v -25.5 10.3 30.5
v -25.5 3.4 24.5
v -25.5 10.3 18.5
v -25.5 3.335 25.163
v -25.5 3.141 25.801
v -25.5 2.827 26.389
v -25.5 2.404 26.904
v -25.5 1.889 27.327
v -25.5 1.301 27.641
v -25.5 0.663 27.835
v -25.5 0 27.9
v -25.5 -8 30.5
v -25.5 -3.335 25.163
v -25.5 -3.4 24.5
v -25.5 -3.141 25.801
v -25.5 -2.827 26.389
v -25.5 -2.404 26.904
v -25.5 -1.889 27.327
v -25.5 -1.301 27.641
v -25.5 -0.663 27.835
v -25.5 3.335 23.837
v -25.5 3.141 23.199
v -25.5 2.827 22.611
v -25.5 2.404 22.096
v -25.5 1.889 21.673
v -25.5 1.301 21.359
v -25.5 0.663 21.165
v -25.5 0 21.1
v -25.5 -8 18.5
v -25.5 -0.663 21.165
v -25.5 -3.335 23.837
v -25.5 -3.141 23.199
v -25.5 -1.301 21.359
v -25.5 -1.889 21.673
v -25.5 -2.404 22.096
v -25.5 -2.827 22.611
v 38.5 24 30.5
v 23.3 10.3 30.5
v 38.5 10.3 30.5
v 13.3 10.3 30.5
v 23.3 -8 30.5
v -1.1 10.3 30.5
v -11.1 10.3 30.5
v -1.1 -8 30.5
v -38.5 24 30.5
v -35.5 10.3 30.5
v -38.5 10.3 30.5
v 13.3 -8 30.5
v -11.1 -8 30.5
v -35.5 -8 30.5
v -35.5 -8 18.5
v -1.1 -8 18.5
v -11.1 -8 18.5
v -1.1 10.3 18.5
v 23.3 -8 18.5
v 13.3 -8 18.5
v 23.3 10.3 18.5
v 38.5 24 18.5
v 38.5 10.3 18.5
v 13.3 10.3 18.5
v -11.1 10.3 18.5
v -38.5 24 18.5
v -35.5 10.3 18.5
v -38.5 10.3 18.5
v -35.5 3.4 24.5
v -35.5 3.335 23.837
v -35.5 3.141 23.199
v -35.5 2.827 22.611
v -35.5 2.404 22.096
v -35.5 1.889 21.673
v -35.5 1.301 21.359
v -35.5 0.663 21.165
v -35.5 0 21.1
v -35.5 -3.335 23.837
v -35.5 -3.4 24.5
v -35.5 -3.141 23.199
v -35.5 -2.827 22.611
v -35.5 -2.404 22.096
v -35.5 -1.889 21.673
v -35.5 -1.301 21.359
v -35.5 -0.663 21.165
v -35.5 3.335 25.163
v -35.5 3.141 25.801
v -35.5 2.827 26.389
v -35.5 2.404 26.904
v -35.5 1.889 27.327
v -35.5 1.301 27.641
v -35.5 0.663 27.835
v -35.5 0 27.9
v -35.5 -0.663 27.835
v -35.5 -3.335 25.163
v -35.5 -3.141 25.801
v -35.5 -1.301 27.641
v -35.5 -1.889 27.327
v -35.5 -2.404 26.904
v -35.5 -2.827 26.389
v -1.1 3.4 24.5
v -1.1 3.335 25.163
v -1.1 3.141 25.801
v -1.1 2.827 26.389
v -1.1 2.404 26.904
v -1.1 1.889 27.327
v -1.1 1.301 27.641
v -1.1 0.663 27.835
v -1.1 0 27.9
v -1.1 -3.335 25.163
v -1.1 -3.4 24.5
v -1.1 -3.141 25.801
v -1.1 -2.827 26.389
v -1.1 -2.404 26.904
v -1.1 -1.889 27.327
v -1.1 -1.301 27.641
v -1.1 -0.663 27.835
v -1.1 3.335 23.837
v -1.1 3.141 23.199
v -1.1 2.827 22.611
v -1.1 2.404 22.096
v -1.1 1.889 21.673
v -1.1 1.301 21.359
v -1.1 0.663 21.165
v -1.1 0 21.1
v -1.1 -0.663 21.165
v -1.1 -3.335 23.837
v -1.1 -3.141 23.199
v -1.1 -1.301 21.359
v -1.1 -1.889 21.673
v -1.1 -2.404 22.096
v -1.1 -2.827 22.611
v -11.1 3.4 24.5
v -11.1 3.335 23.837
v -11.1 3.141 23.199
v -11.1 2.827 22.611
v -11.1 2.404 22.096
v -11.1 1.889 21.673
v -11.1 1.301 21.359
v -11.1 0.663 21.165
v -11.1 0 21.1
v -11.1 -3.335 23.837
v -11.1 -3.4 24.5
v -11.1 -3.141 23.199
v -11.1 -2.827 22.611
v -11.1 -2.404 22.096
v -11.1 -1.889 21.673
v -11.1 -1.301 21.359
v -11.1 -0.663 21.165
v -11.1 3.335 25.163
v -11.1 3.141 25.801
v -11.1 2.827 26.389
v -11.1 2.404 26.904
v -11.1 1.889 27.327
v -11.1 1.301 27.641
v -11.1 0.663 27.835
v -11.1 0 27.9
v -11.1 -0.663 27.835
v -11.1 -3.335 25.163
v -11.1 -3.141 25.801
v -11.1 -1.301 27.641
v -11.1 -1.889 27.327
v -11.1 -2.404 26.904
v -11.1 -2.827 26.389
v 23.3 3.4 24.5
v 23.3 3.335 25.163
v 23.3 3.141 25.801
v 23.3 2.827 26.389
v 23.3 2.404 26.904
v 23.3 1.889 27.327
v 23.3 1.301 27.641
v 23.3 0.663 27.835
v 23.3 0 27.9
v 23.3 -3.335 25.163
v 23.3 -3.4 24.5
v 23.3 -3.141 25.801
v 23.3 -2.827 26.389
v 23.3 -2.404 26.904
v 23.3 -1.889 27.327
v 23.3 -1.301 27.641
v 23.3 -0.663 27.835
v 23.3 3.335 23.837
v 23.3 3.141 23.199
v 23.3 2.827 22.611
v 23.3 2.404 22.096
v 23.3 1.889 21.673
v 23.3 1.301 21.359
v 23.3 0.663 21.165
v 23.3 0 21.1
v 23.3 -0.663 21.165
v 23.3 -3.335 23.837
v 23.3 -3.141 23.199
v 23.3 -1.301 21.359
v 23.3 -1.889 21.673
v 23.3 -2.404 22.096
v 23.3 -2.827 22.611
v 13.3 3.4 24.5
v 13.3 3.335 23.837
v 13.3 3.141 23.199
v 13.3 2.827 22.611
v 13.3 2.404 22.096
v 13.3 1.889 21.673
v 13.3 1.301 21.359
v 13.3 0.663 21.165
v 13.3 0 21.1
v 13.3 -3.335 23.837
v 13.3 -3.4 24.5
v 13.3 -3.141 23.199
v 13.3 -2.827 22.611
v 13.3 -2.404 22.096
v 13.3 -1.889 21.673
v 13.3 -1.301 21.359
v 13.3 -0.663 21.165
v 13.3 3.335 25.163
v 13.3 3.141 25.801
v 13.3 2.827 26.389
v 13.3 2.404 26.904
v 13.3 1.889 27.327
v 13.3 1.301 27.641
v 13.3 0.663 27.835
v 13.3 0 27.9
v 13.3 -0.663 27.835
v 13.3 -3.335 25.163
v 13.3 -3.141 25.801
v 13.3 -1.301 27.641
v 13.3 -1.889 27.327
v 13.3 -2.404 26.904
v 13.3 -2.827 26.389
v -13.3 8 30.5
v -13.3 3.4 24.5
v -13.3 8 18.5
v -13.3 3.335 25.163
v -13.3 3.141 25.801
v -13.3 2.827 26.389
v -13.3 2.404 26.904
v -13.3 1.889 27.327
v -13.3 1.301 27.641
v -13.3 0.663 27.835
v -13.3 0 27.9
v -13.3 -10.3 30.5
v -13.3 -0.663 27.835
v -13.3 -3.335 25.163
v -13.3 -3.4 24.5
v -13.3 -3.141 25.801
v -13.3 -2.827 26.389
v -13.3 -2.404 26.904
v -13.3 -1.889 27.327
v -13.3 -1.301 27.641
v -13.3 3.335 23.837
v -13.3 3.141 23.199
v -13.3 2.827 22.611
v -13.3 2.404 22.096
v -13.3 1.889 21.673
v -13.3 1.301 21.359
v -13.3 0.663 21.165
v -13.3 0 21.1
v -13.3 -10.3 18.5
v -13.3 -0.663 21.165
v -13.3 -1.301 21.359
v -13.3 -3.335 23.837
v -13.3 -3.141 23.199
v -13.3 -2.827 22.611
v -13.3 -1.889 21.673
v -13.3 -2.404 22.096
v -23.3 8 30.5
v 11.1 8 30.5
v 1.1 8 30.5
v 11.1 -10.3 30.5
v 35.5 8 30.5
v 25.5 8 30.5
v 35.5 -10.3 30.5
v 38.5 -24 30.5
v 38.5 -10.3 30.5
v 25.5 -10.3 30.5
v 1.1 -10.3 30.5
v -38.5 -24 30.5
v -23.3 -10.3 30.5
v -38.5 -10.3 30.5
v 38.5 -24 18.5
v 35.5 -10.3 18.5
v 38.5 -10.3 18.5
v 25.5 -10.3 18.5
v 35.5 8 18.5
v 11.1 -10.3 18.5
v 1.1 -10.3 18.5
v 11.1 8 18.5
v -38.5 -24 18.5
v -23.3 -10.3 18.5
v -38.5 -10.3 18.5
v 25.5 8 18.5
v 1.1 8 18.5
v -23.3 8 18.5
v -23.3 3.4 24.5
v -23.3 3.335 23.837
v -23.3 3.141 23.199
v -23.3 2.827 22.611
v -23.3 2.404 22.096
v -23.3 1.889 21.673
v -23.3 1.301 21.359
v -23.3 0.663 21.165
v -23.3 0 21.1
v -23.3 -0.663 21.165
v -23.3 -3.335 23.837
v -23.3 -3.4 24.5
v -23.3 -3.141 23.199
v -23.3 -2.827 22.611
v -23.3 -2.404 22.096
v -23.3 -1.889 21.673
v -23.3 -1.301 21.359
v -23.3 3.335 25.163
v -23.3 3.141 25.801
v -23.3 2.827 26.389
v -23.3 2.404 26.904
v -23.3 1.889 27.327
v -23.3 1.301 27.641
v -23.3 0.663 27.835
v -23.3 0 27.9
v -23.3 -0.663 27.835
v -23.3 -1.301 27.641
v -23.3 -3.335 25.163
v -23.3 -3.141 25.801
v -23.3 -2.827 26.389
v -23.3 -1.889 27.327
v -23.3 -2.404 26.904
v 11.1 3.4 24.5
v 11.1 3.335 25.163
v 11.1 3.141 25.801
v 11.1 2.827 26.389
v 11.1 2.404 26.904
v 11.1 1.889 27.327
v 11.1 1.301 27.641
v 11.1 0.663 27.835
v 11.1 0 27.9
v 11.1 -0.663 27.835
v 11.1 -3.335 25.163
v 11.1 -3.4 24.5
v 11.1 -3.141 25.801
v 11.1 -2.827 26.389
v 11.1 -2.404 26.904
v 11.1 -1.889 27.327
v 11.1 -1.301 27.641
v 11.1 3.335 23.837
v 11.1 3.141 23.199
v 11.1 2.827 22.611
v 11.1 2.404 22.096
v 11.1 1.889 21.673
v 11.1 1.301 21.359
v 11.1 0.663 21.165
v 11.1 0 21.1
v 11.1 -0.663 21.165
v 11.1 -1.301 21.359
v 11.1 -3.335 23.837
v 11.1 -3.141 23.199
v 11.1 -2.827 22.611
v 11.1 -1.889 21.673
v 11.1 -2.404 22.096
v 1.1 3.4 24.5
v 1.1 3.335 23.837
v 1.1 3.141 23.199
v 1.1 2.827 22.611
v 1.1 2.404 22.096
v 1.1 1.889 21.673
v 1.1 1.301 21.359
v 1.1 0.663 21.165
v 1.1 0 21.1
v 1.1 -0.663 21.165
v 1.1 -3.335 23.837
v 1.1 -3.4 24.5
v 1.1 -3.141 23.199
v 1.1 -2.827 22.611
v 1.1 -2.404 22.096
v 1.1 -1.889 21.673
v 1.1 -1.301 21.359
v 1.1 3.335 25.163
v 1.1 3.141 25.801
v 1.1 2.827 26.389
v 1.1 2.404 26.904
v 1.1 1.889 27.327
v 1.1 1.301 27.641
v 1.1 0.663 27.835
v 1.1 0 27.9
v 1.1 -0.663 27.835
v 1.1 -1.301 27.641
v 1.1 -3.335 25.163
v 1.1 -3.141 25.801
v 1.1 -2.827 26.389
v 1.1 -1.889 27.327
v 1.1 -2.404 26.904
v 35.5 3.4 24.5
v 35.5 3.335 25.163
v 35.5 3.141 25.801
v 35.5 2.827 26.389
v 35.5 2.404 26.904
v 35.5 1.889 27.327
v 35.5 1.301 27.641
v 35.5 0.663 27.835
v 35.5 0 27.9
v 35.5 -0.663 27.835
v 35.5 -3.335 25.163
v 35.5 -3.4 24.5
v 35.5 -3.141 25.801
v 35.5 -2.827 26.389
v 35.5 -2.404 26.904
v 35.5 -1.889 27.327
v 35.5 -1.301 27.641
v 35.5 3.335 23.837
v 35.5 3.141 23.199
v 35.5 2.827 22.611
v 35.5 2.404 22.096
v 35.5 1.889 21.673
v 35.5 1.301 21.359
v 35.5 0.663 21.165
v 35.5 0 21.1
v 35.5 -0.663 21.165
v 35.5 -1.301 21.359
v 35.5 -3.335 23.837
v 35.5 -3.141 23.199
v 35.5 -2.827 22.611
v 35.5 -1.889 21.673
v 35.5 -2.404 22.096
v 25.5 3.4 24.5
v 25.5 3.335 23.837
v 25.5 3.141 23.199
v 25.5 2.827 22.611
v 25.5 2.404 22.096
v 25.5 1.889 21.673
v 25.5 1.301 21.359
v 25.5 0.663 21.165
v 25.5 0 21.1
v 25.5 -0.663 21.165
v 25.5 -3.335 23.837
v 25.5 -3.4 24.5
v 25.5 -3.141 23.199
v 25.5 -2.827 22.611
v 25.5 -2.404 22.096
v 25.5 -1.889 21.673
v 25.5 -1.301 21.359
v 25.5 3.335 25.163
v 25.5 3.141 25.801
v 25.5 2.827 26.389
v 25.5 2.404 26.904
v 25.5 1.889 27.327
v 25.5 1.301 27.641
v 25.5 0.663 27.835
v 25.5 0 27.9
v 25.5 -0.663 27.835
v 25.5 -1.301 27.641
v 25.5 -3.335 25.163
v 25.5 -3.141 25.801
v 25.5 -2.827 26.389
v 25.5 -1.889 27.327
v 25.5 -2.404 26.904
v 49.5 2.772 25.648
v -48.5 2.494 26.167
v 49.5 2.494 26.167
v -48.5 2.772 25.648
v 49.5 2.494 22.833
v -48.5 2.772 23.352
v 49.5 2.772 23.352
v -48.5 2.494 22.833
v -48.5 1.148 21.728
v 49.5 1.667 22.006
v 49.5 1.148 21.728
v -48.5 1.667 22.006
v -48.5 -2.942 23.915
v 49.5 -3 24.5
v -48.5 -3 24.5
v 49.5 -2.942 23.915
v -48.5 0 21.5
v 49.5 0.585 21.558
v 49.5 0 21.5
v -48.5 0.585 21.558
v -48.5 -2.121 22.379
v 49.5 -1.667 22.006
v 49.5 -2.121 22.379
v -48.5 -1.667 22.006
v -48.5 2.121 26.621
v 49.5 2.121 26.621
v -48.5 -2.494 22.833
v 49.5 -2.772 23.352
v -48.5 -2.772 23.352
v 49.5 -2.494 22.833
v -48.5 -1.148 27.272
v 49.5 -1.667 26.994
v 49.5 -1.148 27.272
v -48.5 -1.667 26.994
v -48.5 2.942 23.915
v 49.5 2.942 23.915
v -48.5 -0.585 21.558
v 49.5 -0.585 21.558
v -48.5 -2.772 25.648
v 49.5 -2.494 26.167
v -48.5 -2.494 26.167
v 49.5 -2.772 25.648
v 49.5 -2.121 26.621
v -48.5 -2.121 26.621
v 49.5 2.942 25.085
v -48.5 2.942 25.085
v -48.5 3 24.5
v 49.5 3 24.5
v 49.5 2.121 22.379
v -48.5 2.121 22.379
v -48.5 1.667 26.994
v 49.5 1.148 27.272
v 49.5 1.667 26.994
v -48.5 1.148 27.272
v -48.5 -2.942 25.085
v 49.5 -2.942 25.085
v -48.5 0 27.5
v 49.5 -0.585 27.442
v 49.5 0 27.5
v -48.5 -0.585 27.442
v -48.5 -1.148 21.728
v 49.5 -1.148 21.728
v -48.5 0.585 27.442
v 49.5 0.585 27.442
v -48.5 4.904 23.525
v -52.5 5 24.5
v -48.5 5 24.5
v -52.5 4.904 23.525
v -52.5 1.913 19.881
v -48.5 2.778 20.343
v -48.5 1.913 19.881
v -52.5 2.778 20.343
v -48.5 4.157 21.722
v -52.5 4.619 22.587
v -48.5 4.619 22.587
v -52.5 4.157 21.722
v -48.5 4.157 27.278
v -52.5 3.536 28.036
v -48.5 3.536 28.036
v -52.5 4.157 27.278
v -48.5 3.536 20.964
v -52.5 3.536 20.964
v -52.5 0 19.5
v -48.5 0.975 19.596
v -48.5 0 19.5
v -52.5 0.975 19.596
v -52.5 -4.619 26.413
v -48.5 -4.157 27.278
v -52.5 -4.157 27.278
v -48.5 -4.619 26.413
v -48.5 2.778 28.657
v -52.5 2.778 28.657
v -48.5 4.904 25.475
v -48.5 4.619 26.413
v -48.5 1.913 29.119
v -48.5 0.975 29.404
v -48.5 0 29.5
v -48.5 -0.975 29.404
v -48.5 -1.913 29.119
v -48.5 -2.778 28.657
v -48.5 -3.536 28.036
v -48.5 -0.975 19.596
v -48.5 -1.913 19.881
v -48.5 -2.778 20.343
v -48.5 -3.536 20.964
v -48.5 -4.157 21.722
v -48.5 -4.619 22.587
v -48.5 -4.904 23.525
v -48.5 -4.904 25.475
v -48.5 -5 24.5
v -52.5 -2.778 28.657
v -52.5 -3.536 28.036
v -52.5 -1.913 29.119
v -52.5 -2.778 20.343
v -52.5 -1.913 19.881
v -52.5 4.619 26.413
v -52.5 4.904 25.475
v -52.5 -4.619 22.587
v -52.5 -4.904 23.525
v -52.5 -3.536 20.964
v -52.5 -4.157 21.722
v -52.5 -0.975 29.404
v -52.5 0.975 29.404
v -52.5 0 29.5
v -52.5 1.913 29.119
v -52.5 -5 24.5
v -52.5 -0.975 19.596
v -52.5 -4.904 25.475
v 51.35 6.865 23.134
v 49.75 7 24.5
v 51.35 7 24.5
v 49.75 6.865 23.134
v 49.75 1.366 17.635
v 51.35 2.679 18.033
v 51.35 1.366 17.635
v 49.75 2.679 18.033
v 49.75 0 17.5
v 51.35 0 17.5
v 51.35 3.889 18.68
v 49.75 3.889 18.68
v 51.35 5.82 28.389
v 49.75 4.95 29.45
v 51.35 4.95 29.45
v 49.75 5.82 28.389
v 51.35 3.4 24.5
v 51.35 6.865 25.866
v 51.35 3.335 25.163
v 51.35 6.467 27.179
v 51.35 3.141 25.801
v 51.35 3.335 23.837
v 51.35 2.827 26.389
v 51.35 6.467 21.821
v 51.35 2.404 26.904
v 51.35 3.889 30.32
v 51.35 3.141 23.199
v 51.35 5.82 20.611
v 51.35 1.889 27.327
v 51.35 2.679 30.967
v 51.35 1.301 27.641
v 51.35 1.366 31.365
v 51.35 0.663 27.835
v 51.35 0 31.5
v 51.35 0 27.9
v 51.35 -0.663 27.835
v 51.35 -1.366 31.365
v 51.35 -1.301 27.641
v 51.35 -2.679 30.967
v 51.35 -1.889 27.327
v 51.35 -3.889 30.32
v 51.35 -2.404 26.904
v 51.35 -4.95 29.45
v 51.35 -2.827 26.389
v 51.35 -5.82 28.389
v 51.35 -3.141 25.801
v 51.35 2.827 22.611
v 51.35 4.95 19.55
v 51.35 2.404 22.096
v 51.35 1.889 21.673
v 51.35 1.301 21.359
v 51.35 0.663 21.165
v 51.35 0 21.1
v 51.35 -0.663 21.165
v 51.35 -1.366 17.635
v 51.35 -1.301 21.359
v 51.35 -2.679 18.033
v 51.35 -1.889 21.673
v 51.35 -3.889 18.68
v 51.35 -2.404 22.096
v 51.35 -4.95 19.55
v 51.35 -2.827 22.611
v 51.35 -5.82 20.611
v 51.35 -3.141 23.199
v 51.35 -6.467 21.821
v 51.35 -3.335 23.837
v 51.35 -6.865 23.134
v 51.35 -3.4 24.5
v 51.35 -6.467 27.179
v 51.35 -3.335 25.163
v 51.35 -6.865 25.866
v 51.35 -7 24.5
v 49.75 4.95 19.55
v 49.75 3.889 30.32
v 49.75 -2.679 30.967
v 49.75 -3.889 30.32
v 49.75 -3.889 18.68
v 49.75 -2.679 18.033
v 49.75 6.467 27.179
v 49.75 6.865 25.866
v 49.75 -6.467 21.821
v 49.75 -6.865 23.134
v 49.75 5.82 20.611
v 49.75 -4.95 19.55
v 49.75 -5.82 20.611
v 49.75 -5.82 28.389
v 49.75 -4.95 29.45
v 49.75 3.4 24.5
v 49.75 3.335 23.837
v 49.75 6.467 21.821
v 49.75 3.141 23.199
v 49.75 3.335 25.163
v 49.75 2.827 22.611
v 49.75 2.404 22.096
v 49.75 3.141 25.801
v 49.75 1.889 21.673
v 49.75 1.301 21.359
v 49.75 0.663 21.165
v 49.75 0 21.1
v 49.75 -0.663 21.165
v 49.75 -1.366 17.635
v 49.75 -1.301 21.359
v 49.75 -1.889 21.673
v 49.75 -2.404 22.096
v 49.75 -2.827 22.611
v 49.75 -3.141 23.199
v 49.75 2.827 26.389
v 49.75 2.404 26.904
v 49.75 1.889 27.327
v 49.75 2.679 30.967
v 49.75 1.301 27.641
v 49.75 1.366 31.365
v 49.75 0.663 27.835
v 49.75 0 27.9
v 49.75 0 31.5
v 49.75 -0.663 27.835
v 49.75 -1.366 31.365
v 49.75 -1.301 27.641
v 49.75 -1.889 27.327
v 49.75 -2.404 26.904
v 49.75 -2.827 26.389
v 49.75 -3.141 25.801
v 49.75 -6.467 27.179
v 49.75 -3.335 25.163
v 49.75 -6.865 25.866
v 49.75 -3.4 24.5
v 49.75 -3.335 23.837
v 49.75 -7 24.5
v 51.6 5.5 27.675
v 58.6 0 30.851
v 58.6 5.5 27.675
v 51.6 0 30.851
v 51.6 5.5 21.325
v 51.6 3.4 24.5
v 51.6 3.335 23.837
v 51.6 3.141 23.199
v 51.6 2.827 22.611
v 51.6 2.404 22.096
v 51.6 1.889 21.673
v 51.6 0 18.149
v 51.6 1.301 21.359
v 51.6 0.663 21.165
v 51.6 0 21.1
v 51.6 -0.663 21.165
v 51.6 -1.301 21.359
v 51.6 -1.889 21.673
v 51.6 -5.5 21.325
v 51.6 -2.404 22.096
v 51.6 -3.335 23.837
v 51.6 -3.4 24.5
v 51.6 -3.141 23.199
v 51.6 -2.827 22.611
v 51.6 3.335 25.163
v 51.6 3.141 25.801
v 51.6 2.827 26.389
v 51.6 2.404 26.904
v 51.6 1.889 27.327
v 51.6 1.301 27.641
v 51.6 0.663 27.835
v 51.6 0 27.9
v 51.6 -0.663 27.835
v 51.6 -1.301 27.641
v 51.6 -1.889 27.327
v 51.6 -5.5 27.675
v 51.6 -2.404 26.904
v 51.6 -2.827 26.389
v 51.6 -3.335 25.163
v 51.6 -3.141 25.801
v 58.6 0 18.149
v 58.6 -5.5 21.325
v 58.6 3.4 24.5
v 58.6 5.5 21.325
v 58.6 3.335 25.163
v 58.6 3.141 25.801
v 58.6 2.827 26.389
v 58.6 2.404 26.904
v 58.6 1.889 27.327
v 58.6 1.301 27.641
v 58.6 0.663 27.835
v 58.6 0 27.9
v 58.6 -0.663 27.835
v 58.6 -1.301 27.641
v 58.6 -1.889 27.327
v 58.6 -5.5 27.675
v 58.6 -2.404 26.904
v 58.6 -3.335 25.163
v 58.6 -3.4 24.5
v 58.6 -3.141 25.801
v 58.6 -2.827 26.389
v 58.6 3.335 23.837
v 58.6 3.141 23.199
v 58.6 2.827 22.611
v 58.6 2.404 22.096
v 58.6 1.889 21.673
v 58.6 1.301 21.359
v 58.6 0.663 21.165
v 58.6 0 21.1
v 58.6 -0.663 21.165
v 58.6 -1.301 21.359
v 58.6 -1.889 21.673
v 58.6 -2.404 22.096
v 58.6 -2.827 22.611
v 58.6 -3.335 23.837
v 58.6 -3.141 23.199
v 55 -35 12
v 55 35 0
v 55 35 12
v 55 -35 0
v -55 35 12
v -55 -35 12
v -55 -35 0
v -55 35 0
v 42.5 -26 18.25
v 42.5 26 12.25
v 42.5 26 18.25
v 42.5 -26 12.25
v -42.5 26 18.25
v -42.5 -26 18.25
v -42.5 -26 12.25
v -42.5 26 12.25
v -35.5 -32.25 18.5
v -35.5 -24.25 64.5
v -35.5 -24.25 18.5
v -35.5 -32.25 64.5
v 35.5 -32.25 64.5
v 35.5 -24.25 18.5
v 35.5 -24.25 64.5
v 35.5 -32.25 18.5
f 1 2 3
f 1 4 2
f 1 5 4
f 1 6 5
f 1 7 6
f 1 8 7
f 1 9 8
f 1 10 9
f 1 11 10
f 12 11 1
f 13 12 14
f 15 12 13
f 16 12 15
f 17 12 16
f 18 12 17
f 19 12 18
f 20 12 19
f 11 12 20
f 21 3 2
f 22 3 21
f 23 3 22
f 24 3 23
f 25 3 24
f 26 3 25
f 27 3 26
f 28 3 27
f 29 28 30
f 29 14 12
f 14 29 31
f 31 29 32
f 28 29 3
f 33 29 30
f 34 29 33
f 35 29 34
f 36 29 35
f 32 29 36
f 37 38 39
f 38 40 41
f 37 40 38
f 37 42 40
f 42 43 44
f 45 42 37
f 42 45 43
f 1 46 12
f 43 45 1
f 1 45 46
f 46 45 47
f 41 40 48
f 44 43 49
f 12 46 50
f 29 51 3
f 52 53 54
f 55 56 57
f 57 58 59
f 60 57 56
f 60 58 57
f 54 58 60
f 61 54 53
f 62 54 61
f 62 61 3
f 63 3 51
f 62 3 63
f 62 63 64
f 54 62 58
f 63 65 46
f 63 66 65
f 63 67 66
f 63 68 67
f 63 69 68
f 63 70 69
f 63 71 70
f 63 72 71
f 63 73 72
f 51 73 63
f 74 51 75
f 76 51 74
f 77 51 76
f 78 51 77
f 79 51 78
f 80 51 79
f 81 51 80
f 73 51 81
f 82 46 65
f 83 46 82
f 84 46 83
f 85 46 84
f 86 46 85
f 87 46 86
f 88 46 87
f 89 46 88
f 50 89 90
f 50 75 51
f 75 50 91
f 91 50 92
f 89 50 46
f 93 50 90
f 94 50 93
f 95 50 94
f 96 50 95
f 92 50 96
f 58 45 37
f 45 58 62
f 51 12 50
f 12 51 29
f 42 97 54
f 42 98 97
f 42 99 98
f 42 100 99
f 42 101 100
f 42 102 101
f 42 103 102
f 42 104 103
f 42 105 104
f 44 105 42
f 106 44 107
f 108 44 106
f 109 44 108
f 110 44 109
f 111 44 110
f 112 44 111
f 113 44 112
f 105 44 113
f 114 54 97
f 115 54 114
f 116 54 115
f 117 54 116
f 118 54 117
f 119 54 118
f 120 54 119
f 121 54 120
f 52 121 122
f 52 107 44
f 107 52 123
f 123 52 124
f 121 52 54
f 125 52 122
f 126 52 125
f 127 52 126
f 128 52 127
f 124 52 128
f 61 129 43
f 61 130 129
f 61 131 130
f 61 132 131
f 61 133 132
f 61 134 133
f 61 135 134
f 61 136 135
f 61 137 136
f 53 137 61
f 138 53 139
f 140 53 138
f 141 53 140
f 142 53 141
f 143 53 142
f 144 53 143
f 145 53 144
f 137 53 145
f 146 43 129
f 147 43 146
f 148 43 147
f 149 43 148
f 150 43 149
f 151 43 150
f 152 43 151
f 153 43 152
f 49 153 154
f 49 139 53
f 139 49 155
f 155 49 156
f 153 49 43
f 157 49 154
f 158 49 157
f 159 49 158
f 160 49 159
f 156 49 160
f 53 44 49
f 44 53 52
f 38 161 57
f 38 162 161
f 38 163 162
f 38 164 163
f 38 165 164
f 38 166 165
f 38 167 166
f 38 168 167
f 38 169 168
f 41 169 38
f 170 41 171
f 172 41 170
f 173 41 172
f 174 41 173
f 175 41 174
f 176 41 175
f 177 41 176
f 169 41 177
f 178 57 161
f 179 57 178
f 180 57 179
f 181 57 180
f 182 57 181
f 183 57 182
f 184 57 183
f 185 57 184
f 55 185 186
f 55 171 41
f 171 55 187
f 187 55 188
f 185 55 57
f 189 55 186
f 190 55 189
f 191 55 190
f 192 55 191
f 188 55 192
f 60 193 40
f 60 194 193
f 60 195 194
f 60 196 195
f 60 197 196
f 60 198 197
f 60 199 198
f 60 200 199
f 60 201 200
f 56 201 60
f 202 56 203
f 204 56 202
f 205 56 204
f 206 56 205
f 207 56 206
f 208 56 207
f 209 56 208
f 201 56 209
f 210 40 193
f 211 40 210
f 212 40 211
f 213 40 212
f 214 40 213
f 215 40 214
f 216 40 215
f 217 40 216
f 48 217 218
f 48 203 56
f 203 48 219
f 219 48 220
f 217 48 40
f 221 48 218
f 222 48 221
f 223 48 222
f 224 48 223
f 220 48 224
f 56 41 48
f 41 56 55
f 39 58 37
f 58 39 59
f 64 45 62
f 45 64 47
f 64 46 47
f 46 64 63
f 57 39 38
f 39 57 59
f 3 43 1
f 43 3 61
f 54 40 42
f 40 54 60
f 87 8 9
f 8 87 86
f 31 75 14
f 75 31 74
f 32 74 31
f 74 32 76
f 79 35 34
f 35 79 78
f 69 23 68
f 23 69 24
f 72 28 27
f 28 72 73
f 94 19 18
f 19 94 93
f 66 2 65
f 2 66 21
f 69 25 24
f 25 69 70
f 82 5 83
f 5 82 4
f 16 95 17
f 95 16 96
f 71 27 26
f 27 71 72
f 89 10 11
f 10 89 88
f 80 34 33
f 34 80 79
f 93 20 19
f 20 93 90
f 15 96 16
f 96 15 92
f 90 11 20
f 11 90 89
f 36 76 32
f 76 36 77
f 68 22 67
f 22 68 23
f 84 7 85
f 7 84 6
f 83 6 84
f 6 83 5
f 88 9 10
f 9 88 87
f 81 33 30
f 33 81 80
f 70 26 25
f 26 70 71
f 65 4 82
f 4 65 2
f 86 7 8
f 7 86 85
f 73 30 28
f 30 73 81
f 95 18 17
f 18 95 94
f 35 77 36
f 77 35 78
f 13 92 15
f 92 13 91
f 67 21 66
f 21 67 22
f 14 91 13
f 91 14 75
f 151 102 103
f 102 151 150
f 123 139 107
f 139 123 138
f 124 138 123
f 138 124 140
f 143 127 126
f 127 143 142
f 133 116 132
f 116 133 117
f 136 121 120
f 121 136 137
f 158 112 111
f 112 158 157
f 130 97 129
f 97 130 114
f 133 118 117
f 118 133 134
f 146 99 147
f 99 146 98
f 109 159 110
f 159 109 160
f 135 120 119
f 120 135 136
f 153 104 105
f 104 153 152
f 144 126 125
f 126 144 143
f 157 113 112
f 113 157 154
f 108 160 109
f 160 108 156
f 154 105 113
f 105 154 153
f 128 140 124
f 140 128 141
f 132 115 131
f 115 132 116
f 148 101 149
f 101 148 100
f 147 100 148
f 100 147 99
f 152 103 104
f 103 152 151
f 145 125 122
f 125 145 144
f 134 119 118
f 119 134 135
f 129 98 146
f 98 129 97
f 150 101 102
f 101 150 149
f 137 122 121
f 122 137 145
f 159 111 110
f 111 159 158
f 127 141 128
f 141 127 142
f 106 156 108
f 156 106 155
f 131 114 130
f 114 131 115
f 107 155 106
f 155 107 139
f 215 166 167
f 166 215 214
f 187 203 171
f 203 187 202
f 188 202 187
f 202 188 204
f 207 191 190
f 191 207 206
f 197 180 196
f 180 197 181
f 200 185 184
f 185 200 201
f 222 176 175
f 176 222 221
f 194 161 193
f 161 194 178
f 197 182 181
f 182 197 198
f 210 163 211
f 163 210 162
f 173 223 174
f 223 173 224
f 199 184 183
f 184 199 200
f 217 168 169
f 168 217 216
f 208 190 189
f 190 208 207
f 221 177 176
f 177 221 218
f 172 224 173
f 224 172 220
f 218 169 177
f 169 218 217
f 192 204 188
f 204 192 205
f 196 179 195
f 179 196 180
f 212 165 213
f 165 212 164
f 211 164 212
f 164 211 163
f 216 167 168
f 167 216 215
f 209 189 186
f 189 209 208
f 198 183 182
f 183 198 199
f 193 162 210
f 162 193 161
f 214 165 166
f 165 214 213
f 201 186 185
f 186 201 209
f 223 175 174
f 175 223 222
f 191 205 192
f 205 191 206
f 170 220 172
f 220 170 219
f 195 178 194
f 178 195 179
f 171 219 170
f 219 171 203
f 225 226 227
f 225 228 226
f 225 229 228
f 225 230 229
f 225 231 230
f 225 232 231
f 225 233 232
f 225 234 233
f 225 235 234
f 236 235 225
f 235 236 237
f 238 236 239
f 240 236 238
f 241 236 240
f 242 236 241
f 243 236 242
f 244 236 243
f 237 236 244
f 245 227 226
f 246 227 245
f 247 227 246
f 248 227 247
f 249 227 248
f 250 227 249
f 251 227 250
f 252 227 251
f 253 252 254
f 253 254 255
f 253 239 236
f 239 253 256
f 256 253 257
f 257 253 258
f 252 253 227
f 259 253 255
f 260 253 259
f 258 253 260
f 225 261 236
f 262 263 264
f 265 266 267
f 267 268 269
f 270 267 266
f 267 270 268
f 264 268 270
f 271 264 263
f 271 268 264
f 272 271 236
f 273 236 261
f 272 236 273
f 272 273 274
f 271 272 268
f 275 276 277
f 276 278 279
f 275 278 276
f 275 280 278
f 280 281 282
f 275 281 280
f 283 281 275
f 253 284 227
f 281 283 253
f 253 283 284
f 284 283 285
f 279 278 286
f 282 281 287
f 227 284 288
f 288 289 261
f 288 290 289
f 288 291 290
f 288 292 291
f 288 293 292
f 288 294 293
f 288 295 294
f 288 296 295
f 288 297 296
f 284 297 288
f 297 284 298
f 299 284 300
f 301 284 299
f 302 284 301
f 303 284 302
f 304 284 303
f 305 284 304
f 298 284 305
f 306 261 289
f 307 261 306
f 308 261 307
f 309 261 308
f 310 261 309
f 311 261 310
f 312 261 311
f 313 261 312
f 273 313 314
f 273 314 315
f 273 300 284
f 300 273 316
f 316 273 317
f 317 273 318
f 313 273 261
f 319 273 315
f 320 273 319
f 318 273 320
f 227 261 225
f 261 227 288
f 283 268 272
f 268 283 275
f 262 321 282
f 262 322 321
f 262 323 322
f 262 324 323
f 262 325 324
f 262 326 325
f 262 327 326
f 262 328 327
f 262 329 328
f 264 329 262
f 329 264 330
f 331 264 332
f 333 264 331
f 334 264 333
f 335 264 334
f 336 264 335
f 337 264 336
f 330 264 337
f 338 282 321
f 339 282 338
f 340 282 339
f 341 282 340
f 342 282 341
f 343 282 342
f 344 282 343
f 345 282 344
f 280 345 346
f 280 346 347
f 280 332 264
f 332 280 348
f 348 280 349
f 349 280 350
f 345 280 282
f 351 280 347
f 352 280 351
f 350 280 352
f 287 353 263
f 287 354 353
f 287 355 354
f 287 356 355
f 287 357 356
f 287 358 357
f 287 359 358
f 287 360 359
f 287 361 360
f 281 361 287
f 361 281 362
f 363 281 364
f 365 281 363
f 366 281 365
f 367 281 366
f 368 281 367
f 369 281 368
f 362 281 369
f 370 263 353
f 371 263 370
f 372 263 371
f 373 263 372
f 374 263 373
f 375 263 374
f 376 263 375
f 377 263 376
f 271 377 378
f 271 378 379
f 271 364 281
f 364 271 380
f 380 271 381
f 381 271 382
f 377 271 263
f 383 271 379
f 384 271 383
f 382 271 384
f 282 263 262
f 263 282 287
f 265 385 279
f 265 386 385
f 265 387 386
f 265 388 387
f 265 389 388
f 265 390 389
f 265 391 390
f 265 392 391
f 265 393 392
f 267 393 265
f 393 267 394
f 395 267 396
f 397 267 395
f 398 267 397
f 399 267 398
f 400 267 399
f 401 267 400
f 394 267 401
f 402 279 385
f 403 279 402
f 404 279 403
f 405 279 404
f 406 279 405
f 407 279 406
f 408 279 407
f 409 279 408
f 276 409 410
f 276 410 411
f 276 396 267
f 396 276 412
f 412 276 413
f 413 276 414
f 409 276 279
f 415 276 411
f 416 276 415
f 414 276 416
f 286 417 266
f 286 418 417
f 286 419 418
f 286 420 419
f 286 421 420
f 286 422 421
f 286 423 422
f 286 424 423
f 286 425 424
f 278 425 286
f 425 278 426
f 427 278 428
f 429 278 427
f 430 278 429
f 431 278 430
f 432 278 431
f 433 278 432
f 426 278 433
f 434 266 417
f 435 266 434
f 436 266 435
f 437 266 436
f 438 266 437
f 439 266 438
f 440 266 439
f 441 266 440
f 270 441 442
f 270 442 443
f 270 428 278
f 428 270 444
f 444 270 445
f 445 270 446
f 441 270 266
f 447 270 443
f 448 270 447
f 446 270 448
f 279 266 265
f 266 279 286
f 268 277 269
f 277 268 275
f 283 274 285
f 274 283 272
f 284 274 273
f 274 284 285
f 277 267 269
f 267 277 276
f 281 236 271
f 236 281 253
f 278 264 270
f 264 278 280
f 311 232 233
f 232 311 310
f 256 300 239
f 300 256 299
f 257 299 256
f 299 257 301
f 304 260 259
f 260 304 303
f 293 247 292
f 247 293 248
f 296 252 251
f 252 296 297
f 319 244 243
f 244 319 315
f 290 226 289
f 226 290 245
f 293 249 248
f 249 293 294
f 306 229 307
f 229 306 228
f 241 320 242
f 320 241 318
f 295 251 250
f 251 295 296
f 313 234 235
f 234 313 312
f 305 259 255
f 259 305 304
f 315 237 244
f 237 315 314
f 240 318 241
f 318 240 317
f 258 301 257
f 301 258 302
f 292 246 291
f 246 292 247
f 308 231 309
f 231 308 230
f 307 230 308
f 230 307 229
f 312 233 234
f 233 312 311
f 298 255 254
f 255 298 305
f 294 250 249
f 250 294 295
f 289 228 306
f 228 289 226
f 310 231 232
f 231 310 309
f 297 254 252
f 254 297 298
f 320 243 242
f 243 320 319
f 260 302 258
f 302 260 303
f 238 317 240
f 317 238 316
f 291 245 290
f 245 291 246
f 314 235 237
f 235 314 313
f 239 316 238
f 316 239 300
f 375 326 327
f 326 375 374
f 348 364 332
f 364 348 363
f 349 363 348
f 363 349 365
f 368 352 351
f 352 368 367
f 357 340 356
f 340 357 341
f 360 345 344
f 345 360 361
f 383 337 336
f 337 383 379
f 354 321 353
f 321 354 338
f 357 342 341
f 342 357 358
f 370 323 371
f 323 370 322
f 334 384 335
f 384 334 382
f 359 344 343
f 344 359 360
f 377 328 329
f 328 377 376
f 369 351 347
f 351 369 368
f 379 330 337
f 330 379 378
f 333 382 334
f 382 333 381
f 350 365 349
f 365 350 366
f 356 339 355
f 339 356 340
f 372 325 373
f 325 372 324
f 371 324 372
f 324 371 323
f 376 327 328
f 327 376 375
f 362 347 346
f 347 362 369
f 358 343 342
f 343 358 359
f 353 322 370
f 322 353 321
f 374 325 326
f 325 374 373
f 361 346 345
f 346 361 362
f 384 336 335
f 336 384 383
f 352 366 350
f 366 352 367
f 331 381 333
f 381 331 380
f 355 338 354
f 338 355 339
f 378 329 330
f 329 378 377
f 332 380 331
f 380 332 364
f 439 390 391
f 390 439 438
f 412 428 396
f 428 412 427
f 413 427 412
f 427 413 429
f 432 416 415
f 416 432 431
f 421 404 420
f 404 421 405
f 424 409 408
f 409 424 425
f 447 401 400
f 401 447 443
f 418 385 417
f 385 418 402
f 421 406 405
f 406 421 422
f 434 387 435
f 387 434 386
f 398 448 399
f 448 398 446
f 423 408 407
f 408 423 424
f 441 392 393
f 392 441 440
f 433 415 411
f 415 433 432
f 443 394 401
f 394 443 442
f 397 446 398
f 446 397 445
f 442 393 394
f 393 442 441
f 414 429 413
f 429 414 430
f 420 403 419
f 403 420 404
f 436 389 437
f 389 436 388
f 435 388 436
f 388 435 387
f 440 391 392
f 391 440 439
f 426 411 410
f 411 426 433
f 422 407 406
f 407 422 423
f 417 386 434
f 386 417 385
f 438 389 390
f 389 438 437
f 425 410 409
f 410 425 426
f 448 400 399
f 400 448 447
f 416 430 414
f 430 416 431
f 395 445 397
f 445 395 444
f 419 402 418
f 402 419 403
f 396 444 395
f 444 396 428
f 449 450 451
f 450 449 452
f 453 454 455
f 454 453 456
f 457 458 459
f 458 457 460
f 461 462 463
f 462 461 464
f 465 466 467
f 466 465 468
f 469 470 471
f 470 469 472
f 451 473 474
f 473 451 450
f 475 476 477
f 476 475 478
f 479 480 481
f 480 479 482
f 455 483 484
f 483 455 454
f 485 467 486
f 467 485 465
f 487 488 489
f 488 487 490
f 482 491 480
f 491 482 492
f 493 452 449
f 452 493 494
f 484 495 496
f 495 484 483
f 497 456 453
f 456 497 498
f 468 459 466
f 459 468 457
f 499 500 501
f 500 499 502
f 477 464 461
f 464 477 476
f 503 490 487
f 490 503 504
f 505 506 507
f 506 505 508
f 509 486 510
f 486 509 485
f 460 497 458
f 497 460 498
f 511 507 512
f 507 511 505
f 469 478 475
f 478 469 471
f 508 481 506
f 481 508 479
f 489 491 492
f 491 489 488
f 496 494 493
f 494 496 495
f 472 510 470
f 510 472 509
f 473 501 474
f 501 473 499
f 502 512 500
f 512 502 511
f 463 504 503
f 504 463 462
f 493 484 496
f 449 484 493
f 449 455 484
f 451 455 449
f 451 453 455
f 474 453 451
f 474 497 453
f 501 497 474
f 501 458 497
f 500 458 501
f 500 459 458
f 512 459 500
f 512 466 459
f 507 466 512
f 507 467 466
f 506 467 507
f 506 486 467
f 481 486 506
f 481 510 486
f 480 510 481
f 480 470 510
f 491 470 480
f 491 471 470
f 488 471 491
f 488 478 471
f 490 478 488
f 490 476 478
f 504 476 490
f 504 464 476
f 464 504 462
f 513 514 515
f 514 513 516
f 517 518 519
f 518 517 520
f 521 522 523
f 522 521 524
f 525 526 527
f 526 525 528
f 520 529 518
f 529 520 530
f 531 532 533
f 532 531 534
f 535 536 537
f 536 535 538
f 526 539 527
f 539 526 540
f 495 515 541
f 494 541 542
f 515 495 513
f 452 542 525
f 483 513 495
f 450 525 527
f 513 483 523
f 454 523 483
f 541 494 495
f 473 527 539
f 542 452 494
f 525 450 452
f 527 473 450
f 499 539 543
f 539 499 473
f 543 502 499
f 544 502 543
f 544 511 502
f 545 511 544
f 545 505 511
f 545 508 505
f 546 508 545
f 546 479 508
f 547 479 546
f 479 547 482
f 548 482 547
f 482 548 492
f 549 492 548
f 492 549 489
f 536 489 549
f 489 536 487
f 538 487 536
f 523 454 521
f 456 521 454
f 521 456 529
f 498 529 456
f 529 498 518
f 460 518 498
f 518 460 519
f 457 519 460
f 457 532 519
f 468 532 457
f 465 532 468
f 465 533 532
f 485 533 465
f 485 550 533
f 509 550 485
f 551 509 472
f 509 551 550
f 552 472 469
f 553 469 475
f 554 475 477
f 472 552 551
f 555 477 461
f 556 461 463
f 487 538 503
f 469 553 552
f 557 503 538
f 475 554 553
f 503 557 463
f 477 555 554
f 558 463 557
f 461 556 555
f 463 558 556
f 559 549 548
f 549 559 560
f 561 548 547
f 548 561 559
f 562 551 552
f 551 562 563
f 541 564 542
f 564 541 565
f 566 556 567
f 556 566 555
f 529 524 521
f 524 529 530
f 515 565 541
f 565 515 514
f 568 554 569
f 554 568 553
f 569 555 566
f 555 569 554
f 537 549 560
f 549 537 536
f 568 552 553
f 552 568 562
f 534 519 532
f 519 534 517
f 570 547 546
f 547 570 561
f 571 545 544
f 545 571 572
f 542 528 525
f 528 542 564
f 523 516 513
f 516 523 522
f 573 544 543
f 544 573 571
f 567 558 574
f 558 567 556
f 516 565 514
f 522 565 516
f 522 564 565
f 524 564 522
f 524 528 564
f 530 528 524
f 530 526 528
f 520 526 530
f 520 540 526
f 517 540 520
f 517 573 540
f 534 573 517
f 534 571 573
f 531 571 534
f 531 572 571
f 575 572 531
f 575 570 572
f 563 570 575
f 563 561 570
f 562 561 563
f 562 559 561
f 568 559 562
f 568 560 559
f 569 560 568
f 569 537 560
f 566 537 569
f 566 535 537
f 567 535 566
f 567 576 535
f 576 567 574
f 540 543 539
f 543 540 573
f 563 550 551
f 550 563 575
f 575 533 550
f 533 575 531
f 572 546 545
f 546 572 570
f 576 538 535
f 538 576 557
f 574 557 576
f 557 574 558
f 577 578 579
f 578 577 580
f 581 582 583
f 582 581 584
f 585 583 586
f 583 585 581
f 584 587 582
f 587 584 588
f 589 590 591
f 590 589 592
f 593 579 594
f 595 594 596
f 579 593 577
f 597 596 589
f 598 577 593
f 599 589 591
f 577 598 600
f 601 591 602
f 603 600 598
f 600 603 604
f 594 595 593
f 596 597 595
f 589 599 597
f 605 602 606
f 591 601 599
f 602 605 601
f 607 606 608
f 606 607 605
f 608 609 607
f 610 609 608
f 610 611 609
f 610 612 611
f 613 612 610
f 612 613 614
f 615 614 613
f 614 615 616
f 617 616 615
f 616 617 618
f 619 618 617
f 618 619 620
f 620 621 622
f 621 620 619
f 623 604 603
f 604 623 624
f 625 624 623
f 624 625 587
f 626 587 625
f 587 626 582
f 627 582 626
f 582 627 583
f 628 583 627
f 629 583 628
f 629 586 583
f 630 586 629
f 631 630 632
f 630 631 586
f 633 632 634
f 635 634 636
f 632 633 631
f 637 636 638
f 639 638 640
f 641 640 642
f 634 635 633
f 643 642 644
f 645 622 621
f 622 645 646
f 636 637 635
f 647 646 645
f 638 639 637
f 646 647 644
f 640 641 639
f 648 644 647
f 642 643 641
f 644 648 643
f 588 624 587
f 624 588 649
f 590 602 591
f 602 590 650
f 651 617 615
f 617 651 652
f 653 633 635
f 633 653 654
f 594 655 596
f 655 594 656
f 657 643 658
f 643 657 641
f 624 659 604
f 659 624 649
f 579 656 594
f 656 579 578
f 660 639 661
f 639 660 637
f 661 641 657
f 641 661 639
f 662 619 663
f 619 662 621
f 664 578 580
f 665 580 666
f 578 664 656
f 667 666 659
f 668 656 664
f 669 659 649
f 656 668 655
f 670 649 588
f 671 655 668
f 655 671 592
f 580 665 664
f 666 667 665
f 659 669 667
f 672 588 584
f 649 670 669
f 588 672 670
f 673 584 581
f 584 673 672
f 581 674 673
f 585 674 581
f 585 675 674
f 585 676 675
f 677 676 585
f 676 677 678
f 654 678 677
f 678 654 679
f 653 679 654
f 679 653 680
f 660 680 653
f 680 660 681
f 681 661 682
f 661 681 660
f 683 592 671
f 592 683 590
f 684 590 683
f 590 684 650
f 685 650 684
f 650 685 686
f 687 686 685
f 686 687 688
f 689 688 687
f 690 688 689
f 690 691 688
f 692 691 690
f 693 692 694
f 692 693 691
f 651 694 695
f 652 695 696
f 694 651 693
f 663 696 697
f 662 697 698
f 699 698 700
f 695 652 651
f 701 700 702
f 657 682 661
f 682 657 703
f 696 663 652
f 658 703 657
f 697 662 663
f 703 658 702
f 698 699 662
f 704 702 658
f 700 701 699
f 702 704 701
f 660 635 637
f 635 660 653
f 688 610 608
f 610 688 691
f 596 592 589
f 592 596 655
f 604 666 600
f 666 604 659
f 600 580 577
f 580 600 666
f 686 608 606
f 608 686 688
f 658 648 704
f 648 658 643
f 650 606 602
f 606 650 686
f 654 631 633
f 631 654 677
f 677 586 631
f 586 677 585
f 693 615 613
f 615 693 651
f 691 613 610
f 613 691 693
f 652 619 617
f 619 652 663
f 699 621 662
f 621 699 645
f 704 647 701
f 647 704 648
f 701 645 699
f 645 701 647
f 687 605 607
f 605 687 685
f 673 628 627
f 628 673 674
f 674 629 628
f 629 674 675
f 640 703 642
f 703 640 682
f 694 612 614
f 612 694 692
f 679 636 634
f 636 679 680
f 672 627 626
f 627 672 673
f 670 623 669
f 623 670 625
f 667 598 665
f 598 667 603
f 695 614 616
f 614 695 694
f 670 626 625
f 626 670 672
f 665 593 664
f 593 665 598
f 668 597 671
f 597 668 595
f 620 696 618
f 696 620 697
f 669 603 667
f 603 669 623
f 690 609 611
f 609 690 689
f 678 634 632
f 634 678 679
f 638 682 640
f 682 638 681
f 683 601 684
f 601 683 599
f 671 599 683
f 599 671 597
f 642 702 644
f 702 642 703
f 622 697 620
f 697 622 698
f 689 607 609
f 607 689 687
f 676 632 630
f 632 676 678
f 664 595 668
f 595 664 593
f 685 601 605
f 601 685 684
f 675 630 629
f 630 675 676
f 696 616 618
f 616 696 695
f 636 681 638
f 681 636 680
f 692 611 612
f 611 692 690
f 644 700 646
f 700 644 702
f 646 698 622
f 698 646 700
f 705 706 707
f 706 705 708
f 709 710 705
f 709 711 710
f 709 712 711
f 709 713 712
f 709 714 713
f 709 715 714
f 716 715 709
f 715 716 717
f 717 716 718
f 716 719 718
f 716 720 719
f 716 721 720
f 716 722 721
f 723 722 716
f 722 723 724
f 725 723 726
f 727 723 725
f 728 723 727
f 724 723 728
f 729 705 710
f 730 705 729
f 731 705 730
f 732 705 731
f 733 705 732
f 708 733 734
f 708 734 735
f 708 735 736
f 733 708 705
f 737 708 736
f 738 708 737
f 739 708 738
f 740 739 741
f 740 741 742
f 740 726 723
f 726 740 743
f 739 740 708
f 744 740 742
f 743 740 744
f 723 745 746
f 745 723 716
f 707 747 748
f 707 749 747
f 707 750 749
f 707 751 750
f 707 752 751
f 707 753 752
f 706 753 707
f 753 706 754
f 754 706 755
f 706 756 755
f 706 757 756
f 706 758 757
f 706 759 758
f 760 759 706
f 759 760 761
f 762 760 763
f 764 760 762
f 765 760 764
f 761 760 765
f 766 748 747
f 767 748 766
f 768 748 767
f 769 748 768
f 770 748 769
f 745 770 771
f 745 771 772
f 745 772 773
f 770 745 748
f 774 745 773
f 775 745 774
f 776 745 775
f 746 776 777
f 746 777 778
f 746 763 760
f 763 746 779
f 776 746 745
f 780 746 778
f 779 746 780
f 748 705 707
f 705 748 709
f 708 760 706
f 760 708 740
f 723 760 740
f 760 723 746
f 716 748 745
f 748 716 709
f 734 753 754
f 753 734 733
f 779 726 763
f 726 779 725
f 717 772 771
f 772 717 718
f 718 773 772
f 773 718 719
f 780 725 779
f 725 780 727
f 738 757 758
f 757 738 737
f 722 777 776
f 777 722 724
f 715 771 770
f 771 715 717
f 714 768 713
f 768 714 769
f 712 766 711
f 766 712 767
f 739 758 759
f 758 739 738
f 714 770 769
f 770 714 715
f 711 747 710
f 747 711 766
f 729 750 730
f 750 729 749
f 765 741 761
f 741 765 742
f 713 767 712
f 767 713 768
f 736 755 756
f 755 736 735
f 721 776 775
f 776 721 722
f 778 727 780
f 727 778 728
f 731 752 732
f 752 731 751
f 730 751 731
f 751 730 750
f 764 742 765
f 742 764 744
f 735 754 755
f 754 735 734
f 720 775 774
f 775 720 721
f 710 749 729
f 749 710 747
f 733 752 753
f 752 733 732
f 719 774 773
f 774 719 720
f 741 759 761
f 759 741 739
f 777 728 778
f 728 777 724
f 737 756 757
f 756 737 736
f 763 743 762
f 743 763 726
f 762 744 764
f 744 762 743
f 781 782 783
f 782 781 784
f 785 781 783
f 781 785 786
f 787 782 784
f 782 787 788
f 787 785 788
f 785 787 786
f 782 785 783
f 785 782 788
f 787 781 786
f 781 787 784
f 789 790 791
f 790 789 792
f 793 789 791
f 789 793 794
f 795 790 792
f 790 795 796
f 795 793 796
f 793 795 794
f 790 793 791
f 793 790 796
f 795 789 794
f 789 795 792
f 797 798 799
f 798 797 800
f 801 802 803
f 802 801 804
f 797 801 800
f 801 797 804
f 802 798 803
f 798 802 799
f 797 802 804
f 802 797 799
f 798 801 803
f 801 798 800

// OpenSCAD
$fn = 32;

// ------------------------------------------------------------------------
// Comb hinge with flap: leaf 77 x 24 mm, pin d6, flap 46 mm
// Every part is its own module, assembly() places every instance.
// ------------------------------------------------------------------------

// --- part 1 ---
module hinge_bed() {
  difference() {
    translate([-55, -35, 0]) cube([110, 70, 12]);
  }
}

// --- part 2 ---
module hinge_riser() {
  difference() {
    translate([-42.5, -26, 0]) cube([85, 52, 6]);
  }
}

// --- part 3 ---
module hinge_leaf_a() {
  difference() {
    union() {
      translate([-35.5, -8, -6]) cube([10, 32, 12]);
      translate([-11.1, -8, -6]) cube([10, 32, 12]);
      translate([13.3, -8, -6]) cube([10, 32, 12]);
      translate([-38.5, 10.3, -6]) cube([77, 13.7, 12]);
    }
    translate([-30.5, 0, 0]) rotate([0, 90, 0]) cylinder(h = 12, d = 6.8, center = true);
    translate([-6.1, 0, 0]) rotate([0, 90, 0]) cylinder(h = 12, d = 6.8, center = true);
    translate([18.3, 0, 0]) rotate([0, 90, 0]) cylinder(h = 12, d = 6.8, center = true);
  }
}

// --- part 4 ---
module hinge_leaf_b() {
  difference() {
    union() {
      translate([-23.3, -24, -6]) cube([10, 32, 12]);
      translate([1.1, -24, -6]) cube([10, 32, 12]);
      translate([25.5, -24, -6]) cube([10, 32, 12]);
      translate([-38.5, -24, -6]) cube([77, 13.7, 12]);
    }
    translate([-18.3, 0, 0]) rotate([0, 90, 0]) cylinder(h = 12, d = 6.8, center = true);
    translate([6.1, 0, 0]) rotate([0, 90, 0]) cylinder(h = 12, d = 6.8, center = true);
    translate([30.5, 0, 0]) rotate([0, 90, 0]) cylinder(h = 12, d = 6.8, center = true);
  }
}

// --- part 5 ---
module hinge_flap() {
  difference() {
    translate([-35.5, -23, 0]) cube([71, 46, 8]);
  }
}

// --- part 6 ---
module hinge_pin() {
  rotate([0, 90, 0]) cylinder(h = 99, d = 6, center = true);
  translate([-52.5, 0, 0]) rotate([0, 90, 0]) cylinder(h = 4, d = 10);
}

// --- part 7 ---
module pin_washer() {
  difference() {
      translate([0, 0, 0]) cylinder(h = 1.6, d = 14);
      translate([0, 0, -1]) cylinder(h = 3.6, d = 6.8);
    }
}

// --- part 8 ---
module pin_nut() {
  difference() {
    linear_extrude(height = 7) polygon(points = [[6.351, 0], [3.175, 5.5], [-3.175, 5.5], [-6.351, 0], [-3.175, -5.5], [3.175, -5.5]]);
    translate([0, 0, -1]) cylinder(h = 9, d = 6.8);
  }
}

// --- assembly ---
module assembly() {
  color([0.80, 0.24, 0.20]) translate([0, 0, 0]) rotate([0, 0, 0]) hinge_bed();
  color([0.20, 0.45, 0.75]) translate([0, 0, 12.25]) rotate([0, 0, 0]) hinge_riser();
  color([0.25, 0.62, 0.32]) translate([0, 0, 24.5]) rotate([0, 0, 0]) hinge_leaf_a();
  color([0.92, 0.70, 0.18]) translate([0, 0, 24.5]) rotate([0, 0, 0]) hinge_leaf_b();
  color([0.58, 0.35, 0.70]) translate([0, -24.25, 41.5]) rotate([90, 0, 0]) hinge_flap();
  color([0.16, 0.66, 0.66]) translate([0, 0, 24.5]) rotate([0, 0, 0]) hinge_pin();
  color([0.85, 0.48, 0.18]) translate([49.75, 0, 24.5]) rotate([0, 90, 0]) pin_washer();
  color([0.55, 0.60, 0.65]) translate([51.6, 0, 24.5]) rotate([0, 90, 0]) pin_nut();
}

assembly();
